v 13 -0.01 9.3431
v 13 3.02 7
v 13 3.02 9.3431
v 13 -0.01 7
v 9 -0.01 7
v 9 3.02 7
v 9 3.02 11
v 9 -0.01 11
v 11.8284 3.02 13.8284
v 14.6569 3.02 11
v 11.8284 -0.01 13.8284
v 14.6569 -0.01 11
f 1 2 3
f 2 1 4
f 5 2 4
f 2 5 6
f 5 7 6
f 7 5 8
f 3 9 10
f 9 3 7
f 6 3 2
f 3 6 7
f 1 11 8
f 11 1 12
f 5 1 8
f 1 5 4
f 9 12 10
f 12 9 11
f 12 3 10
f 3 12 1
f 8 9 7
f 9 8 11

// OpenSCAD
//difference(){
//translate([-80,-64.6]) import("RampsBase2.stl");
  translate([9,-.01,7]) {
    cube([4,3.03,4]);
    translate([0,0,4]) rotate([0,45,0]) cube([4,3.03,4]);
  }
//}
*translate([0,0,3]) {
translate([56.5,20]) {
  difference(){
    cylinder(d=6,h=3,$fn=30);
    cylinder(d=3,h=3.01,$fn=20);
  }
  translate([0,82.5,0]) difference(){
    cylinder(d=6,h=3,$fn=30);
    cylinder(d=3,h=3.01,$fn=20);
  }
  translate([-49,1])
  {
    difference(){
      cylinder(d=6,h=3,$fn=30);
      cylinder(d=3,h=3.01,$fn=20);
    }
    translate([0,75])
      difference(){
        cylinder(d=6,h=3,$fn=30);
        cylinder(d=3,h=3.01,$fn=20);
      }
  }
}
}
